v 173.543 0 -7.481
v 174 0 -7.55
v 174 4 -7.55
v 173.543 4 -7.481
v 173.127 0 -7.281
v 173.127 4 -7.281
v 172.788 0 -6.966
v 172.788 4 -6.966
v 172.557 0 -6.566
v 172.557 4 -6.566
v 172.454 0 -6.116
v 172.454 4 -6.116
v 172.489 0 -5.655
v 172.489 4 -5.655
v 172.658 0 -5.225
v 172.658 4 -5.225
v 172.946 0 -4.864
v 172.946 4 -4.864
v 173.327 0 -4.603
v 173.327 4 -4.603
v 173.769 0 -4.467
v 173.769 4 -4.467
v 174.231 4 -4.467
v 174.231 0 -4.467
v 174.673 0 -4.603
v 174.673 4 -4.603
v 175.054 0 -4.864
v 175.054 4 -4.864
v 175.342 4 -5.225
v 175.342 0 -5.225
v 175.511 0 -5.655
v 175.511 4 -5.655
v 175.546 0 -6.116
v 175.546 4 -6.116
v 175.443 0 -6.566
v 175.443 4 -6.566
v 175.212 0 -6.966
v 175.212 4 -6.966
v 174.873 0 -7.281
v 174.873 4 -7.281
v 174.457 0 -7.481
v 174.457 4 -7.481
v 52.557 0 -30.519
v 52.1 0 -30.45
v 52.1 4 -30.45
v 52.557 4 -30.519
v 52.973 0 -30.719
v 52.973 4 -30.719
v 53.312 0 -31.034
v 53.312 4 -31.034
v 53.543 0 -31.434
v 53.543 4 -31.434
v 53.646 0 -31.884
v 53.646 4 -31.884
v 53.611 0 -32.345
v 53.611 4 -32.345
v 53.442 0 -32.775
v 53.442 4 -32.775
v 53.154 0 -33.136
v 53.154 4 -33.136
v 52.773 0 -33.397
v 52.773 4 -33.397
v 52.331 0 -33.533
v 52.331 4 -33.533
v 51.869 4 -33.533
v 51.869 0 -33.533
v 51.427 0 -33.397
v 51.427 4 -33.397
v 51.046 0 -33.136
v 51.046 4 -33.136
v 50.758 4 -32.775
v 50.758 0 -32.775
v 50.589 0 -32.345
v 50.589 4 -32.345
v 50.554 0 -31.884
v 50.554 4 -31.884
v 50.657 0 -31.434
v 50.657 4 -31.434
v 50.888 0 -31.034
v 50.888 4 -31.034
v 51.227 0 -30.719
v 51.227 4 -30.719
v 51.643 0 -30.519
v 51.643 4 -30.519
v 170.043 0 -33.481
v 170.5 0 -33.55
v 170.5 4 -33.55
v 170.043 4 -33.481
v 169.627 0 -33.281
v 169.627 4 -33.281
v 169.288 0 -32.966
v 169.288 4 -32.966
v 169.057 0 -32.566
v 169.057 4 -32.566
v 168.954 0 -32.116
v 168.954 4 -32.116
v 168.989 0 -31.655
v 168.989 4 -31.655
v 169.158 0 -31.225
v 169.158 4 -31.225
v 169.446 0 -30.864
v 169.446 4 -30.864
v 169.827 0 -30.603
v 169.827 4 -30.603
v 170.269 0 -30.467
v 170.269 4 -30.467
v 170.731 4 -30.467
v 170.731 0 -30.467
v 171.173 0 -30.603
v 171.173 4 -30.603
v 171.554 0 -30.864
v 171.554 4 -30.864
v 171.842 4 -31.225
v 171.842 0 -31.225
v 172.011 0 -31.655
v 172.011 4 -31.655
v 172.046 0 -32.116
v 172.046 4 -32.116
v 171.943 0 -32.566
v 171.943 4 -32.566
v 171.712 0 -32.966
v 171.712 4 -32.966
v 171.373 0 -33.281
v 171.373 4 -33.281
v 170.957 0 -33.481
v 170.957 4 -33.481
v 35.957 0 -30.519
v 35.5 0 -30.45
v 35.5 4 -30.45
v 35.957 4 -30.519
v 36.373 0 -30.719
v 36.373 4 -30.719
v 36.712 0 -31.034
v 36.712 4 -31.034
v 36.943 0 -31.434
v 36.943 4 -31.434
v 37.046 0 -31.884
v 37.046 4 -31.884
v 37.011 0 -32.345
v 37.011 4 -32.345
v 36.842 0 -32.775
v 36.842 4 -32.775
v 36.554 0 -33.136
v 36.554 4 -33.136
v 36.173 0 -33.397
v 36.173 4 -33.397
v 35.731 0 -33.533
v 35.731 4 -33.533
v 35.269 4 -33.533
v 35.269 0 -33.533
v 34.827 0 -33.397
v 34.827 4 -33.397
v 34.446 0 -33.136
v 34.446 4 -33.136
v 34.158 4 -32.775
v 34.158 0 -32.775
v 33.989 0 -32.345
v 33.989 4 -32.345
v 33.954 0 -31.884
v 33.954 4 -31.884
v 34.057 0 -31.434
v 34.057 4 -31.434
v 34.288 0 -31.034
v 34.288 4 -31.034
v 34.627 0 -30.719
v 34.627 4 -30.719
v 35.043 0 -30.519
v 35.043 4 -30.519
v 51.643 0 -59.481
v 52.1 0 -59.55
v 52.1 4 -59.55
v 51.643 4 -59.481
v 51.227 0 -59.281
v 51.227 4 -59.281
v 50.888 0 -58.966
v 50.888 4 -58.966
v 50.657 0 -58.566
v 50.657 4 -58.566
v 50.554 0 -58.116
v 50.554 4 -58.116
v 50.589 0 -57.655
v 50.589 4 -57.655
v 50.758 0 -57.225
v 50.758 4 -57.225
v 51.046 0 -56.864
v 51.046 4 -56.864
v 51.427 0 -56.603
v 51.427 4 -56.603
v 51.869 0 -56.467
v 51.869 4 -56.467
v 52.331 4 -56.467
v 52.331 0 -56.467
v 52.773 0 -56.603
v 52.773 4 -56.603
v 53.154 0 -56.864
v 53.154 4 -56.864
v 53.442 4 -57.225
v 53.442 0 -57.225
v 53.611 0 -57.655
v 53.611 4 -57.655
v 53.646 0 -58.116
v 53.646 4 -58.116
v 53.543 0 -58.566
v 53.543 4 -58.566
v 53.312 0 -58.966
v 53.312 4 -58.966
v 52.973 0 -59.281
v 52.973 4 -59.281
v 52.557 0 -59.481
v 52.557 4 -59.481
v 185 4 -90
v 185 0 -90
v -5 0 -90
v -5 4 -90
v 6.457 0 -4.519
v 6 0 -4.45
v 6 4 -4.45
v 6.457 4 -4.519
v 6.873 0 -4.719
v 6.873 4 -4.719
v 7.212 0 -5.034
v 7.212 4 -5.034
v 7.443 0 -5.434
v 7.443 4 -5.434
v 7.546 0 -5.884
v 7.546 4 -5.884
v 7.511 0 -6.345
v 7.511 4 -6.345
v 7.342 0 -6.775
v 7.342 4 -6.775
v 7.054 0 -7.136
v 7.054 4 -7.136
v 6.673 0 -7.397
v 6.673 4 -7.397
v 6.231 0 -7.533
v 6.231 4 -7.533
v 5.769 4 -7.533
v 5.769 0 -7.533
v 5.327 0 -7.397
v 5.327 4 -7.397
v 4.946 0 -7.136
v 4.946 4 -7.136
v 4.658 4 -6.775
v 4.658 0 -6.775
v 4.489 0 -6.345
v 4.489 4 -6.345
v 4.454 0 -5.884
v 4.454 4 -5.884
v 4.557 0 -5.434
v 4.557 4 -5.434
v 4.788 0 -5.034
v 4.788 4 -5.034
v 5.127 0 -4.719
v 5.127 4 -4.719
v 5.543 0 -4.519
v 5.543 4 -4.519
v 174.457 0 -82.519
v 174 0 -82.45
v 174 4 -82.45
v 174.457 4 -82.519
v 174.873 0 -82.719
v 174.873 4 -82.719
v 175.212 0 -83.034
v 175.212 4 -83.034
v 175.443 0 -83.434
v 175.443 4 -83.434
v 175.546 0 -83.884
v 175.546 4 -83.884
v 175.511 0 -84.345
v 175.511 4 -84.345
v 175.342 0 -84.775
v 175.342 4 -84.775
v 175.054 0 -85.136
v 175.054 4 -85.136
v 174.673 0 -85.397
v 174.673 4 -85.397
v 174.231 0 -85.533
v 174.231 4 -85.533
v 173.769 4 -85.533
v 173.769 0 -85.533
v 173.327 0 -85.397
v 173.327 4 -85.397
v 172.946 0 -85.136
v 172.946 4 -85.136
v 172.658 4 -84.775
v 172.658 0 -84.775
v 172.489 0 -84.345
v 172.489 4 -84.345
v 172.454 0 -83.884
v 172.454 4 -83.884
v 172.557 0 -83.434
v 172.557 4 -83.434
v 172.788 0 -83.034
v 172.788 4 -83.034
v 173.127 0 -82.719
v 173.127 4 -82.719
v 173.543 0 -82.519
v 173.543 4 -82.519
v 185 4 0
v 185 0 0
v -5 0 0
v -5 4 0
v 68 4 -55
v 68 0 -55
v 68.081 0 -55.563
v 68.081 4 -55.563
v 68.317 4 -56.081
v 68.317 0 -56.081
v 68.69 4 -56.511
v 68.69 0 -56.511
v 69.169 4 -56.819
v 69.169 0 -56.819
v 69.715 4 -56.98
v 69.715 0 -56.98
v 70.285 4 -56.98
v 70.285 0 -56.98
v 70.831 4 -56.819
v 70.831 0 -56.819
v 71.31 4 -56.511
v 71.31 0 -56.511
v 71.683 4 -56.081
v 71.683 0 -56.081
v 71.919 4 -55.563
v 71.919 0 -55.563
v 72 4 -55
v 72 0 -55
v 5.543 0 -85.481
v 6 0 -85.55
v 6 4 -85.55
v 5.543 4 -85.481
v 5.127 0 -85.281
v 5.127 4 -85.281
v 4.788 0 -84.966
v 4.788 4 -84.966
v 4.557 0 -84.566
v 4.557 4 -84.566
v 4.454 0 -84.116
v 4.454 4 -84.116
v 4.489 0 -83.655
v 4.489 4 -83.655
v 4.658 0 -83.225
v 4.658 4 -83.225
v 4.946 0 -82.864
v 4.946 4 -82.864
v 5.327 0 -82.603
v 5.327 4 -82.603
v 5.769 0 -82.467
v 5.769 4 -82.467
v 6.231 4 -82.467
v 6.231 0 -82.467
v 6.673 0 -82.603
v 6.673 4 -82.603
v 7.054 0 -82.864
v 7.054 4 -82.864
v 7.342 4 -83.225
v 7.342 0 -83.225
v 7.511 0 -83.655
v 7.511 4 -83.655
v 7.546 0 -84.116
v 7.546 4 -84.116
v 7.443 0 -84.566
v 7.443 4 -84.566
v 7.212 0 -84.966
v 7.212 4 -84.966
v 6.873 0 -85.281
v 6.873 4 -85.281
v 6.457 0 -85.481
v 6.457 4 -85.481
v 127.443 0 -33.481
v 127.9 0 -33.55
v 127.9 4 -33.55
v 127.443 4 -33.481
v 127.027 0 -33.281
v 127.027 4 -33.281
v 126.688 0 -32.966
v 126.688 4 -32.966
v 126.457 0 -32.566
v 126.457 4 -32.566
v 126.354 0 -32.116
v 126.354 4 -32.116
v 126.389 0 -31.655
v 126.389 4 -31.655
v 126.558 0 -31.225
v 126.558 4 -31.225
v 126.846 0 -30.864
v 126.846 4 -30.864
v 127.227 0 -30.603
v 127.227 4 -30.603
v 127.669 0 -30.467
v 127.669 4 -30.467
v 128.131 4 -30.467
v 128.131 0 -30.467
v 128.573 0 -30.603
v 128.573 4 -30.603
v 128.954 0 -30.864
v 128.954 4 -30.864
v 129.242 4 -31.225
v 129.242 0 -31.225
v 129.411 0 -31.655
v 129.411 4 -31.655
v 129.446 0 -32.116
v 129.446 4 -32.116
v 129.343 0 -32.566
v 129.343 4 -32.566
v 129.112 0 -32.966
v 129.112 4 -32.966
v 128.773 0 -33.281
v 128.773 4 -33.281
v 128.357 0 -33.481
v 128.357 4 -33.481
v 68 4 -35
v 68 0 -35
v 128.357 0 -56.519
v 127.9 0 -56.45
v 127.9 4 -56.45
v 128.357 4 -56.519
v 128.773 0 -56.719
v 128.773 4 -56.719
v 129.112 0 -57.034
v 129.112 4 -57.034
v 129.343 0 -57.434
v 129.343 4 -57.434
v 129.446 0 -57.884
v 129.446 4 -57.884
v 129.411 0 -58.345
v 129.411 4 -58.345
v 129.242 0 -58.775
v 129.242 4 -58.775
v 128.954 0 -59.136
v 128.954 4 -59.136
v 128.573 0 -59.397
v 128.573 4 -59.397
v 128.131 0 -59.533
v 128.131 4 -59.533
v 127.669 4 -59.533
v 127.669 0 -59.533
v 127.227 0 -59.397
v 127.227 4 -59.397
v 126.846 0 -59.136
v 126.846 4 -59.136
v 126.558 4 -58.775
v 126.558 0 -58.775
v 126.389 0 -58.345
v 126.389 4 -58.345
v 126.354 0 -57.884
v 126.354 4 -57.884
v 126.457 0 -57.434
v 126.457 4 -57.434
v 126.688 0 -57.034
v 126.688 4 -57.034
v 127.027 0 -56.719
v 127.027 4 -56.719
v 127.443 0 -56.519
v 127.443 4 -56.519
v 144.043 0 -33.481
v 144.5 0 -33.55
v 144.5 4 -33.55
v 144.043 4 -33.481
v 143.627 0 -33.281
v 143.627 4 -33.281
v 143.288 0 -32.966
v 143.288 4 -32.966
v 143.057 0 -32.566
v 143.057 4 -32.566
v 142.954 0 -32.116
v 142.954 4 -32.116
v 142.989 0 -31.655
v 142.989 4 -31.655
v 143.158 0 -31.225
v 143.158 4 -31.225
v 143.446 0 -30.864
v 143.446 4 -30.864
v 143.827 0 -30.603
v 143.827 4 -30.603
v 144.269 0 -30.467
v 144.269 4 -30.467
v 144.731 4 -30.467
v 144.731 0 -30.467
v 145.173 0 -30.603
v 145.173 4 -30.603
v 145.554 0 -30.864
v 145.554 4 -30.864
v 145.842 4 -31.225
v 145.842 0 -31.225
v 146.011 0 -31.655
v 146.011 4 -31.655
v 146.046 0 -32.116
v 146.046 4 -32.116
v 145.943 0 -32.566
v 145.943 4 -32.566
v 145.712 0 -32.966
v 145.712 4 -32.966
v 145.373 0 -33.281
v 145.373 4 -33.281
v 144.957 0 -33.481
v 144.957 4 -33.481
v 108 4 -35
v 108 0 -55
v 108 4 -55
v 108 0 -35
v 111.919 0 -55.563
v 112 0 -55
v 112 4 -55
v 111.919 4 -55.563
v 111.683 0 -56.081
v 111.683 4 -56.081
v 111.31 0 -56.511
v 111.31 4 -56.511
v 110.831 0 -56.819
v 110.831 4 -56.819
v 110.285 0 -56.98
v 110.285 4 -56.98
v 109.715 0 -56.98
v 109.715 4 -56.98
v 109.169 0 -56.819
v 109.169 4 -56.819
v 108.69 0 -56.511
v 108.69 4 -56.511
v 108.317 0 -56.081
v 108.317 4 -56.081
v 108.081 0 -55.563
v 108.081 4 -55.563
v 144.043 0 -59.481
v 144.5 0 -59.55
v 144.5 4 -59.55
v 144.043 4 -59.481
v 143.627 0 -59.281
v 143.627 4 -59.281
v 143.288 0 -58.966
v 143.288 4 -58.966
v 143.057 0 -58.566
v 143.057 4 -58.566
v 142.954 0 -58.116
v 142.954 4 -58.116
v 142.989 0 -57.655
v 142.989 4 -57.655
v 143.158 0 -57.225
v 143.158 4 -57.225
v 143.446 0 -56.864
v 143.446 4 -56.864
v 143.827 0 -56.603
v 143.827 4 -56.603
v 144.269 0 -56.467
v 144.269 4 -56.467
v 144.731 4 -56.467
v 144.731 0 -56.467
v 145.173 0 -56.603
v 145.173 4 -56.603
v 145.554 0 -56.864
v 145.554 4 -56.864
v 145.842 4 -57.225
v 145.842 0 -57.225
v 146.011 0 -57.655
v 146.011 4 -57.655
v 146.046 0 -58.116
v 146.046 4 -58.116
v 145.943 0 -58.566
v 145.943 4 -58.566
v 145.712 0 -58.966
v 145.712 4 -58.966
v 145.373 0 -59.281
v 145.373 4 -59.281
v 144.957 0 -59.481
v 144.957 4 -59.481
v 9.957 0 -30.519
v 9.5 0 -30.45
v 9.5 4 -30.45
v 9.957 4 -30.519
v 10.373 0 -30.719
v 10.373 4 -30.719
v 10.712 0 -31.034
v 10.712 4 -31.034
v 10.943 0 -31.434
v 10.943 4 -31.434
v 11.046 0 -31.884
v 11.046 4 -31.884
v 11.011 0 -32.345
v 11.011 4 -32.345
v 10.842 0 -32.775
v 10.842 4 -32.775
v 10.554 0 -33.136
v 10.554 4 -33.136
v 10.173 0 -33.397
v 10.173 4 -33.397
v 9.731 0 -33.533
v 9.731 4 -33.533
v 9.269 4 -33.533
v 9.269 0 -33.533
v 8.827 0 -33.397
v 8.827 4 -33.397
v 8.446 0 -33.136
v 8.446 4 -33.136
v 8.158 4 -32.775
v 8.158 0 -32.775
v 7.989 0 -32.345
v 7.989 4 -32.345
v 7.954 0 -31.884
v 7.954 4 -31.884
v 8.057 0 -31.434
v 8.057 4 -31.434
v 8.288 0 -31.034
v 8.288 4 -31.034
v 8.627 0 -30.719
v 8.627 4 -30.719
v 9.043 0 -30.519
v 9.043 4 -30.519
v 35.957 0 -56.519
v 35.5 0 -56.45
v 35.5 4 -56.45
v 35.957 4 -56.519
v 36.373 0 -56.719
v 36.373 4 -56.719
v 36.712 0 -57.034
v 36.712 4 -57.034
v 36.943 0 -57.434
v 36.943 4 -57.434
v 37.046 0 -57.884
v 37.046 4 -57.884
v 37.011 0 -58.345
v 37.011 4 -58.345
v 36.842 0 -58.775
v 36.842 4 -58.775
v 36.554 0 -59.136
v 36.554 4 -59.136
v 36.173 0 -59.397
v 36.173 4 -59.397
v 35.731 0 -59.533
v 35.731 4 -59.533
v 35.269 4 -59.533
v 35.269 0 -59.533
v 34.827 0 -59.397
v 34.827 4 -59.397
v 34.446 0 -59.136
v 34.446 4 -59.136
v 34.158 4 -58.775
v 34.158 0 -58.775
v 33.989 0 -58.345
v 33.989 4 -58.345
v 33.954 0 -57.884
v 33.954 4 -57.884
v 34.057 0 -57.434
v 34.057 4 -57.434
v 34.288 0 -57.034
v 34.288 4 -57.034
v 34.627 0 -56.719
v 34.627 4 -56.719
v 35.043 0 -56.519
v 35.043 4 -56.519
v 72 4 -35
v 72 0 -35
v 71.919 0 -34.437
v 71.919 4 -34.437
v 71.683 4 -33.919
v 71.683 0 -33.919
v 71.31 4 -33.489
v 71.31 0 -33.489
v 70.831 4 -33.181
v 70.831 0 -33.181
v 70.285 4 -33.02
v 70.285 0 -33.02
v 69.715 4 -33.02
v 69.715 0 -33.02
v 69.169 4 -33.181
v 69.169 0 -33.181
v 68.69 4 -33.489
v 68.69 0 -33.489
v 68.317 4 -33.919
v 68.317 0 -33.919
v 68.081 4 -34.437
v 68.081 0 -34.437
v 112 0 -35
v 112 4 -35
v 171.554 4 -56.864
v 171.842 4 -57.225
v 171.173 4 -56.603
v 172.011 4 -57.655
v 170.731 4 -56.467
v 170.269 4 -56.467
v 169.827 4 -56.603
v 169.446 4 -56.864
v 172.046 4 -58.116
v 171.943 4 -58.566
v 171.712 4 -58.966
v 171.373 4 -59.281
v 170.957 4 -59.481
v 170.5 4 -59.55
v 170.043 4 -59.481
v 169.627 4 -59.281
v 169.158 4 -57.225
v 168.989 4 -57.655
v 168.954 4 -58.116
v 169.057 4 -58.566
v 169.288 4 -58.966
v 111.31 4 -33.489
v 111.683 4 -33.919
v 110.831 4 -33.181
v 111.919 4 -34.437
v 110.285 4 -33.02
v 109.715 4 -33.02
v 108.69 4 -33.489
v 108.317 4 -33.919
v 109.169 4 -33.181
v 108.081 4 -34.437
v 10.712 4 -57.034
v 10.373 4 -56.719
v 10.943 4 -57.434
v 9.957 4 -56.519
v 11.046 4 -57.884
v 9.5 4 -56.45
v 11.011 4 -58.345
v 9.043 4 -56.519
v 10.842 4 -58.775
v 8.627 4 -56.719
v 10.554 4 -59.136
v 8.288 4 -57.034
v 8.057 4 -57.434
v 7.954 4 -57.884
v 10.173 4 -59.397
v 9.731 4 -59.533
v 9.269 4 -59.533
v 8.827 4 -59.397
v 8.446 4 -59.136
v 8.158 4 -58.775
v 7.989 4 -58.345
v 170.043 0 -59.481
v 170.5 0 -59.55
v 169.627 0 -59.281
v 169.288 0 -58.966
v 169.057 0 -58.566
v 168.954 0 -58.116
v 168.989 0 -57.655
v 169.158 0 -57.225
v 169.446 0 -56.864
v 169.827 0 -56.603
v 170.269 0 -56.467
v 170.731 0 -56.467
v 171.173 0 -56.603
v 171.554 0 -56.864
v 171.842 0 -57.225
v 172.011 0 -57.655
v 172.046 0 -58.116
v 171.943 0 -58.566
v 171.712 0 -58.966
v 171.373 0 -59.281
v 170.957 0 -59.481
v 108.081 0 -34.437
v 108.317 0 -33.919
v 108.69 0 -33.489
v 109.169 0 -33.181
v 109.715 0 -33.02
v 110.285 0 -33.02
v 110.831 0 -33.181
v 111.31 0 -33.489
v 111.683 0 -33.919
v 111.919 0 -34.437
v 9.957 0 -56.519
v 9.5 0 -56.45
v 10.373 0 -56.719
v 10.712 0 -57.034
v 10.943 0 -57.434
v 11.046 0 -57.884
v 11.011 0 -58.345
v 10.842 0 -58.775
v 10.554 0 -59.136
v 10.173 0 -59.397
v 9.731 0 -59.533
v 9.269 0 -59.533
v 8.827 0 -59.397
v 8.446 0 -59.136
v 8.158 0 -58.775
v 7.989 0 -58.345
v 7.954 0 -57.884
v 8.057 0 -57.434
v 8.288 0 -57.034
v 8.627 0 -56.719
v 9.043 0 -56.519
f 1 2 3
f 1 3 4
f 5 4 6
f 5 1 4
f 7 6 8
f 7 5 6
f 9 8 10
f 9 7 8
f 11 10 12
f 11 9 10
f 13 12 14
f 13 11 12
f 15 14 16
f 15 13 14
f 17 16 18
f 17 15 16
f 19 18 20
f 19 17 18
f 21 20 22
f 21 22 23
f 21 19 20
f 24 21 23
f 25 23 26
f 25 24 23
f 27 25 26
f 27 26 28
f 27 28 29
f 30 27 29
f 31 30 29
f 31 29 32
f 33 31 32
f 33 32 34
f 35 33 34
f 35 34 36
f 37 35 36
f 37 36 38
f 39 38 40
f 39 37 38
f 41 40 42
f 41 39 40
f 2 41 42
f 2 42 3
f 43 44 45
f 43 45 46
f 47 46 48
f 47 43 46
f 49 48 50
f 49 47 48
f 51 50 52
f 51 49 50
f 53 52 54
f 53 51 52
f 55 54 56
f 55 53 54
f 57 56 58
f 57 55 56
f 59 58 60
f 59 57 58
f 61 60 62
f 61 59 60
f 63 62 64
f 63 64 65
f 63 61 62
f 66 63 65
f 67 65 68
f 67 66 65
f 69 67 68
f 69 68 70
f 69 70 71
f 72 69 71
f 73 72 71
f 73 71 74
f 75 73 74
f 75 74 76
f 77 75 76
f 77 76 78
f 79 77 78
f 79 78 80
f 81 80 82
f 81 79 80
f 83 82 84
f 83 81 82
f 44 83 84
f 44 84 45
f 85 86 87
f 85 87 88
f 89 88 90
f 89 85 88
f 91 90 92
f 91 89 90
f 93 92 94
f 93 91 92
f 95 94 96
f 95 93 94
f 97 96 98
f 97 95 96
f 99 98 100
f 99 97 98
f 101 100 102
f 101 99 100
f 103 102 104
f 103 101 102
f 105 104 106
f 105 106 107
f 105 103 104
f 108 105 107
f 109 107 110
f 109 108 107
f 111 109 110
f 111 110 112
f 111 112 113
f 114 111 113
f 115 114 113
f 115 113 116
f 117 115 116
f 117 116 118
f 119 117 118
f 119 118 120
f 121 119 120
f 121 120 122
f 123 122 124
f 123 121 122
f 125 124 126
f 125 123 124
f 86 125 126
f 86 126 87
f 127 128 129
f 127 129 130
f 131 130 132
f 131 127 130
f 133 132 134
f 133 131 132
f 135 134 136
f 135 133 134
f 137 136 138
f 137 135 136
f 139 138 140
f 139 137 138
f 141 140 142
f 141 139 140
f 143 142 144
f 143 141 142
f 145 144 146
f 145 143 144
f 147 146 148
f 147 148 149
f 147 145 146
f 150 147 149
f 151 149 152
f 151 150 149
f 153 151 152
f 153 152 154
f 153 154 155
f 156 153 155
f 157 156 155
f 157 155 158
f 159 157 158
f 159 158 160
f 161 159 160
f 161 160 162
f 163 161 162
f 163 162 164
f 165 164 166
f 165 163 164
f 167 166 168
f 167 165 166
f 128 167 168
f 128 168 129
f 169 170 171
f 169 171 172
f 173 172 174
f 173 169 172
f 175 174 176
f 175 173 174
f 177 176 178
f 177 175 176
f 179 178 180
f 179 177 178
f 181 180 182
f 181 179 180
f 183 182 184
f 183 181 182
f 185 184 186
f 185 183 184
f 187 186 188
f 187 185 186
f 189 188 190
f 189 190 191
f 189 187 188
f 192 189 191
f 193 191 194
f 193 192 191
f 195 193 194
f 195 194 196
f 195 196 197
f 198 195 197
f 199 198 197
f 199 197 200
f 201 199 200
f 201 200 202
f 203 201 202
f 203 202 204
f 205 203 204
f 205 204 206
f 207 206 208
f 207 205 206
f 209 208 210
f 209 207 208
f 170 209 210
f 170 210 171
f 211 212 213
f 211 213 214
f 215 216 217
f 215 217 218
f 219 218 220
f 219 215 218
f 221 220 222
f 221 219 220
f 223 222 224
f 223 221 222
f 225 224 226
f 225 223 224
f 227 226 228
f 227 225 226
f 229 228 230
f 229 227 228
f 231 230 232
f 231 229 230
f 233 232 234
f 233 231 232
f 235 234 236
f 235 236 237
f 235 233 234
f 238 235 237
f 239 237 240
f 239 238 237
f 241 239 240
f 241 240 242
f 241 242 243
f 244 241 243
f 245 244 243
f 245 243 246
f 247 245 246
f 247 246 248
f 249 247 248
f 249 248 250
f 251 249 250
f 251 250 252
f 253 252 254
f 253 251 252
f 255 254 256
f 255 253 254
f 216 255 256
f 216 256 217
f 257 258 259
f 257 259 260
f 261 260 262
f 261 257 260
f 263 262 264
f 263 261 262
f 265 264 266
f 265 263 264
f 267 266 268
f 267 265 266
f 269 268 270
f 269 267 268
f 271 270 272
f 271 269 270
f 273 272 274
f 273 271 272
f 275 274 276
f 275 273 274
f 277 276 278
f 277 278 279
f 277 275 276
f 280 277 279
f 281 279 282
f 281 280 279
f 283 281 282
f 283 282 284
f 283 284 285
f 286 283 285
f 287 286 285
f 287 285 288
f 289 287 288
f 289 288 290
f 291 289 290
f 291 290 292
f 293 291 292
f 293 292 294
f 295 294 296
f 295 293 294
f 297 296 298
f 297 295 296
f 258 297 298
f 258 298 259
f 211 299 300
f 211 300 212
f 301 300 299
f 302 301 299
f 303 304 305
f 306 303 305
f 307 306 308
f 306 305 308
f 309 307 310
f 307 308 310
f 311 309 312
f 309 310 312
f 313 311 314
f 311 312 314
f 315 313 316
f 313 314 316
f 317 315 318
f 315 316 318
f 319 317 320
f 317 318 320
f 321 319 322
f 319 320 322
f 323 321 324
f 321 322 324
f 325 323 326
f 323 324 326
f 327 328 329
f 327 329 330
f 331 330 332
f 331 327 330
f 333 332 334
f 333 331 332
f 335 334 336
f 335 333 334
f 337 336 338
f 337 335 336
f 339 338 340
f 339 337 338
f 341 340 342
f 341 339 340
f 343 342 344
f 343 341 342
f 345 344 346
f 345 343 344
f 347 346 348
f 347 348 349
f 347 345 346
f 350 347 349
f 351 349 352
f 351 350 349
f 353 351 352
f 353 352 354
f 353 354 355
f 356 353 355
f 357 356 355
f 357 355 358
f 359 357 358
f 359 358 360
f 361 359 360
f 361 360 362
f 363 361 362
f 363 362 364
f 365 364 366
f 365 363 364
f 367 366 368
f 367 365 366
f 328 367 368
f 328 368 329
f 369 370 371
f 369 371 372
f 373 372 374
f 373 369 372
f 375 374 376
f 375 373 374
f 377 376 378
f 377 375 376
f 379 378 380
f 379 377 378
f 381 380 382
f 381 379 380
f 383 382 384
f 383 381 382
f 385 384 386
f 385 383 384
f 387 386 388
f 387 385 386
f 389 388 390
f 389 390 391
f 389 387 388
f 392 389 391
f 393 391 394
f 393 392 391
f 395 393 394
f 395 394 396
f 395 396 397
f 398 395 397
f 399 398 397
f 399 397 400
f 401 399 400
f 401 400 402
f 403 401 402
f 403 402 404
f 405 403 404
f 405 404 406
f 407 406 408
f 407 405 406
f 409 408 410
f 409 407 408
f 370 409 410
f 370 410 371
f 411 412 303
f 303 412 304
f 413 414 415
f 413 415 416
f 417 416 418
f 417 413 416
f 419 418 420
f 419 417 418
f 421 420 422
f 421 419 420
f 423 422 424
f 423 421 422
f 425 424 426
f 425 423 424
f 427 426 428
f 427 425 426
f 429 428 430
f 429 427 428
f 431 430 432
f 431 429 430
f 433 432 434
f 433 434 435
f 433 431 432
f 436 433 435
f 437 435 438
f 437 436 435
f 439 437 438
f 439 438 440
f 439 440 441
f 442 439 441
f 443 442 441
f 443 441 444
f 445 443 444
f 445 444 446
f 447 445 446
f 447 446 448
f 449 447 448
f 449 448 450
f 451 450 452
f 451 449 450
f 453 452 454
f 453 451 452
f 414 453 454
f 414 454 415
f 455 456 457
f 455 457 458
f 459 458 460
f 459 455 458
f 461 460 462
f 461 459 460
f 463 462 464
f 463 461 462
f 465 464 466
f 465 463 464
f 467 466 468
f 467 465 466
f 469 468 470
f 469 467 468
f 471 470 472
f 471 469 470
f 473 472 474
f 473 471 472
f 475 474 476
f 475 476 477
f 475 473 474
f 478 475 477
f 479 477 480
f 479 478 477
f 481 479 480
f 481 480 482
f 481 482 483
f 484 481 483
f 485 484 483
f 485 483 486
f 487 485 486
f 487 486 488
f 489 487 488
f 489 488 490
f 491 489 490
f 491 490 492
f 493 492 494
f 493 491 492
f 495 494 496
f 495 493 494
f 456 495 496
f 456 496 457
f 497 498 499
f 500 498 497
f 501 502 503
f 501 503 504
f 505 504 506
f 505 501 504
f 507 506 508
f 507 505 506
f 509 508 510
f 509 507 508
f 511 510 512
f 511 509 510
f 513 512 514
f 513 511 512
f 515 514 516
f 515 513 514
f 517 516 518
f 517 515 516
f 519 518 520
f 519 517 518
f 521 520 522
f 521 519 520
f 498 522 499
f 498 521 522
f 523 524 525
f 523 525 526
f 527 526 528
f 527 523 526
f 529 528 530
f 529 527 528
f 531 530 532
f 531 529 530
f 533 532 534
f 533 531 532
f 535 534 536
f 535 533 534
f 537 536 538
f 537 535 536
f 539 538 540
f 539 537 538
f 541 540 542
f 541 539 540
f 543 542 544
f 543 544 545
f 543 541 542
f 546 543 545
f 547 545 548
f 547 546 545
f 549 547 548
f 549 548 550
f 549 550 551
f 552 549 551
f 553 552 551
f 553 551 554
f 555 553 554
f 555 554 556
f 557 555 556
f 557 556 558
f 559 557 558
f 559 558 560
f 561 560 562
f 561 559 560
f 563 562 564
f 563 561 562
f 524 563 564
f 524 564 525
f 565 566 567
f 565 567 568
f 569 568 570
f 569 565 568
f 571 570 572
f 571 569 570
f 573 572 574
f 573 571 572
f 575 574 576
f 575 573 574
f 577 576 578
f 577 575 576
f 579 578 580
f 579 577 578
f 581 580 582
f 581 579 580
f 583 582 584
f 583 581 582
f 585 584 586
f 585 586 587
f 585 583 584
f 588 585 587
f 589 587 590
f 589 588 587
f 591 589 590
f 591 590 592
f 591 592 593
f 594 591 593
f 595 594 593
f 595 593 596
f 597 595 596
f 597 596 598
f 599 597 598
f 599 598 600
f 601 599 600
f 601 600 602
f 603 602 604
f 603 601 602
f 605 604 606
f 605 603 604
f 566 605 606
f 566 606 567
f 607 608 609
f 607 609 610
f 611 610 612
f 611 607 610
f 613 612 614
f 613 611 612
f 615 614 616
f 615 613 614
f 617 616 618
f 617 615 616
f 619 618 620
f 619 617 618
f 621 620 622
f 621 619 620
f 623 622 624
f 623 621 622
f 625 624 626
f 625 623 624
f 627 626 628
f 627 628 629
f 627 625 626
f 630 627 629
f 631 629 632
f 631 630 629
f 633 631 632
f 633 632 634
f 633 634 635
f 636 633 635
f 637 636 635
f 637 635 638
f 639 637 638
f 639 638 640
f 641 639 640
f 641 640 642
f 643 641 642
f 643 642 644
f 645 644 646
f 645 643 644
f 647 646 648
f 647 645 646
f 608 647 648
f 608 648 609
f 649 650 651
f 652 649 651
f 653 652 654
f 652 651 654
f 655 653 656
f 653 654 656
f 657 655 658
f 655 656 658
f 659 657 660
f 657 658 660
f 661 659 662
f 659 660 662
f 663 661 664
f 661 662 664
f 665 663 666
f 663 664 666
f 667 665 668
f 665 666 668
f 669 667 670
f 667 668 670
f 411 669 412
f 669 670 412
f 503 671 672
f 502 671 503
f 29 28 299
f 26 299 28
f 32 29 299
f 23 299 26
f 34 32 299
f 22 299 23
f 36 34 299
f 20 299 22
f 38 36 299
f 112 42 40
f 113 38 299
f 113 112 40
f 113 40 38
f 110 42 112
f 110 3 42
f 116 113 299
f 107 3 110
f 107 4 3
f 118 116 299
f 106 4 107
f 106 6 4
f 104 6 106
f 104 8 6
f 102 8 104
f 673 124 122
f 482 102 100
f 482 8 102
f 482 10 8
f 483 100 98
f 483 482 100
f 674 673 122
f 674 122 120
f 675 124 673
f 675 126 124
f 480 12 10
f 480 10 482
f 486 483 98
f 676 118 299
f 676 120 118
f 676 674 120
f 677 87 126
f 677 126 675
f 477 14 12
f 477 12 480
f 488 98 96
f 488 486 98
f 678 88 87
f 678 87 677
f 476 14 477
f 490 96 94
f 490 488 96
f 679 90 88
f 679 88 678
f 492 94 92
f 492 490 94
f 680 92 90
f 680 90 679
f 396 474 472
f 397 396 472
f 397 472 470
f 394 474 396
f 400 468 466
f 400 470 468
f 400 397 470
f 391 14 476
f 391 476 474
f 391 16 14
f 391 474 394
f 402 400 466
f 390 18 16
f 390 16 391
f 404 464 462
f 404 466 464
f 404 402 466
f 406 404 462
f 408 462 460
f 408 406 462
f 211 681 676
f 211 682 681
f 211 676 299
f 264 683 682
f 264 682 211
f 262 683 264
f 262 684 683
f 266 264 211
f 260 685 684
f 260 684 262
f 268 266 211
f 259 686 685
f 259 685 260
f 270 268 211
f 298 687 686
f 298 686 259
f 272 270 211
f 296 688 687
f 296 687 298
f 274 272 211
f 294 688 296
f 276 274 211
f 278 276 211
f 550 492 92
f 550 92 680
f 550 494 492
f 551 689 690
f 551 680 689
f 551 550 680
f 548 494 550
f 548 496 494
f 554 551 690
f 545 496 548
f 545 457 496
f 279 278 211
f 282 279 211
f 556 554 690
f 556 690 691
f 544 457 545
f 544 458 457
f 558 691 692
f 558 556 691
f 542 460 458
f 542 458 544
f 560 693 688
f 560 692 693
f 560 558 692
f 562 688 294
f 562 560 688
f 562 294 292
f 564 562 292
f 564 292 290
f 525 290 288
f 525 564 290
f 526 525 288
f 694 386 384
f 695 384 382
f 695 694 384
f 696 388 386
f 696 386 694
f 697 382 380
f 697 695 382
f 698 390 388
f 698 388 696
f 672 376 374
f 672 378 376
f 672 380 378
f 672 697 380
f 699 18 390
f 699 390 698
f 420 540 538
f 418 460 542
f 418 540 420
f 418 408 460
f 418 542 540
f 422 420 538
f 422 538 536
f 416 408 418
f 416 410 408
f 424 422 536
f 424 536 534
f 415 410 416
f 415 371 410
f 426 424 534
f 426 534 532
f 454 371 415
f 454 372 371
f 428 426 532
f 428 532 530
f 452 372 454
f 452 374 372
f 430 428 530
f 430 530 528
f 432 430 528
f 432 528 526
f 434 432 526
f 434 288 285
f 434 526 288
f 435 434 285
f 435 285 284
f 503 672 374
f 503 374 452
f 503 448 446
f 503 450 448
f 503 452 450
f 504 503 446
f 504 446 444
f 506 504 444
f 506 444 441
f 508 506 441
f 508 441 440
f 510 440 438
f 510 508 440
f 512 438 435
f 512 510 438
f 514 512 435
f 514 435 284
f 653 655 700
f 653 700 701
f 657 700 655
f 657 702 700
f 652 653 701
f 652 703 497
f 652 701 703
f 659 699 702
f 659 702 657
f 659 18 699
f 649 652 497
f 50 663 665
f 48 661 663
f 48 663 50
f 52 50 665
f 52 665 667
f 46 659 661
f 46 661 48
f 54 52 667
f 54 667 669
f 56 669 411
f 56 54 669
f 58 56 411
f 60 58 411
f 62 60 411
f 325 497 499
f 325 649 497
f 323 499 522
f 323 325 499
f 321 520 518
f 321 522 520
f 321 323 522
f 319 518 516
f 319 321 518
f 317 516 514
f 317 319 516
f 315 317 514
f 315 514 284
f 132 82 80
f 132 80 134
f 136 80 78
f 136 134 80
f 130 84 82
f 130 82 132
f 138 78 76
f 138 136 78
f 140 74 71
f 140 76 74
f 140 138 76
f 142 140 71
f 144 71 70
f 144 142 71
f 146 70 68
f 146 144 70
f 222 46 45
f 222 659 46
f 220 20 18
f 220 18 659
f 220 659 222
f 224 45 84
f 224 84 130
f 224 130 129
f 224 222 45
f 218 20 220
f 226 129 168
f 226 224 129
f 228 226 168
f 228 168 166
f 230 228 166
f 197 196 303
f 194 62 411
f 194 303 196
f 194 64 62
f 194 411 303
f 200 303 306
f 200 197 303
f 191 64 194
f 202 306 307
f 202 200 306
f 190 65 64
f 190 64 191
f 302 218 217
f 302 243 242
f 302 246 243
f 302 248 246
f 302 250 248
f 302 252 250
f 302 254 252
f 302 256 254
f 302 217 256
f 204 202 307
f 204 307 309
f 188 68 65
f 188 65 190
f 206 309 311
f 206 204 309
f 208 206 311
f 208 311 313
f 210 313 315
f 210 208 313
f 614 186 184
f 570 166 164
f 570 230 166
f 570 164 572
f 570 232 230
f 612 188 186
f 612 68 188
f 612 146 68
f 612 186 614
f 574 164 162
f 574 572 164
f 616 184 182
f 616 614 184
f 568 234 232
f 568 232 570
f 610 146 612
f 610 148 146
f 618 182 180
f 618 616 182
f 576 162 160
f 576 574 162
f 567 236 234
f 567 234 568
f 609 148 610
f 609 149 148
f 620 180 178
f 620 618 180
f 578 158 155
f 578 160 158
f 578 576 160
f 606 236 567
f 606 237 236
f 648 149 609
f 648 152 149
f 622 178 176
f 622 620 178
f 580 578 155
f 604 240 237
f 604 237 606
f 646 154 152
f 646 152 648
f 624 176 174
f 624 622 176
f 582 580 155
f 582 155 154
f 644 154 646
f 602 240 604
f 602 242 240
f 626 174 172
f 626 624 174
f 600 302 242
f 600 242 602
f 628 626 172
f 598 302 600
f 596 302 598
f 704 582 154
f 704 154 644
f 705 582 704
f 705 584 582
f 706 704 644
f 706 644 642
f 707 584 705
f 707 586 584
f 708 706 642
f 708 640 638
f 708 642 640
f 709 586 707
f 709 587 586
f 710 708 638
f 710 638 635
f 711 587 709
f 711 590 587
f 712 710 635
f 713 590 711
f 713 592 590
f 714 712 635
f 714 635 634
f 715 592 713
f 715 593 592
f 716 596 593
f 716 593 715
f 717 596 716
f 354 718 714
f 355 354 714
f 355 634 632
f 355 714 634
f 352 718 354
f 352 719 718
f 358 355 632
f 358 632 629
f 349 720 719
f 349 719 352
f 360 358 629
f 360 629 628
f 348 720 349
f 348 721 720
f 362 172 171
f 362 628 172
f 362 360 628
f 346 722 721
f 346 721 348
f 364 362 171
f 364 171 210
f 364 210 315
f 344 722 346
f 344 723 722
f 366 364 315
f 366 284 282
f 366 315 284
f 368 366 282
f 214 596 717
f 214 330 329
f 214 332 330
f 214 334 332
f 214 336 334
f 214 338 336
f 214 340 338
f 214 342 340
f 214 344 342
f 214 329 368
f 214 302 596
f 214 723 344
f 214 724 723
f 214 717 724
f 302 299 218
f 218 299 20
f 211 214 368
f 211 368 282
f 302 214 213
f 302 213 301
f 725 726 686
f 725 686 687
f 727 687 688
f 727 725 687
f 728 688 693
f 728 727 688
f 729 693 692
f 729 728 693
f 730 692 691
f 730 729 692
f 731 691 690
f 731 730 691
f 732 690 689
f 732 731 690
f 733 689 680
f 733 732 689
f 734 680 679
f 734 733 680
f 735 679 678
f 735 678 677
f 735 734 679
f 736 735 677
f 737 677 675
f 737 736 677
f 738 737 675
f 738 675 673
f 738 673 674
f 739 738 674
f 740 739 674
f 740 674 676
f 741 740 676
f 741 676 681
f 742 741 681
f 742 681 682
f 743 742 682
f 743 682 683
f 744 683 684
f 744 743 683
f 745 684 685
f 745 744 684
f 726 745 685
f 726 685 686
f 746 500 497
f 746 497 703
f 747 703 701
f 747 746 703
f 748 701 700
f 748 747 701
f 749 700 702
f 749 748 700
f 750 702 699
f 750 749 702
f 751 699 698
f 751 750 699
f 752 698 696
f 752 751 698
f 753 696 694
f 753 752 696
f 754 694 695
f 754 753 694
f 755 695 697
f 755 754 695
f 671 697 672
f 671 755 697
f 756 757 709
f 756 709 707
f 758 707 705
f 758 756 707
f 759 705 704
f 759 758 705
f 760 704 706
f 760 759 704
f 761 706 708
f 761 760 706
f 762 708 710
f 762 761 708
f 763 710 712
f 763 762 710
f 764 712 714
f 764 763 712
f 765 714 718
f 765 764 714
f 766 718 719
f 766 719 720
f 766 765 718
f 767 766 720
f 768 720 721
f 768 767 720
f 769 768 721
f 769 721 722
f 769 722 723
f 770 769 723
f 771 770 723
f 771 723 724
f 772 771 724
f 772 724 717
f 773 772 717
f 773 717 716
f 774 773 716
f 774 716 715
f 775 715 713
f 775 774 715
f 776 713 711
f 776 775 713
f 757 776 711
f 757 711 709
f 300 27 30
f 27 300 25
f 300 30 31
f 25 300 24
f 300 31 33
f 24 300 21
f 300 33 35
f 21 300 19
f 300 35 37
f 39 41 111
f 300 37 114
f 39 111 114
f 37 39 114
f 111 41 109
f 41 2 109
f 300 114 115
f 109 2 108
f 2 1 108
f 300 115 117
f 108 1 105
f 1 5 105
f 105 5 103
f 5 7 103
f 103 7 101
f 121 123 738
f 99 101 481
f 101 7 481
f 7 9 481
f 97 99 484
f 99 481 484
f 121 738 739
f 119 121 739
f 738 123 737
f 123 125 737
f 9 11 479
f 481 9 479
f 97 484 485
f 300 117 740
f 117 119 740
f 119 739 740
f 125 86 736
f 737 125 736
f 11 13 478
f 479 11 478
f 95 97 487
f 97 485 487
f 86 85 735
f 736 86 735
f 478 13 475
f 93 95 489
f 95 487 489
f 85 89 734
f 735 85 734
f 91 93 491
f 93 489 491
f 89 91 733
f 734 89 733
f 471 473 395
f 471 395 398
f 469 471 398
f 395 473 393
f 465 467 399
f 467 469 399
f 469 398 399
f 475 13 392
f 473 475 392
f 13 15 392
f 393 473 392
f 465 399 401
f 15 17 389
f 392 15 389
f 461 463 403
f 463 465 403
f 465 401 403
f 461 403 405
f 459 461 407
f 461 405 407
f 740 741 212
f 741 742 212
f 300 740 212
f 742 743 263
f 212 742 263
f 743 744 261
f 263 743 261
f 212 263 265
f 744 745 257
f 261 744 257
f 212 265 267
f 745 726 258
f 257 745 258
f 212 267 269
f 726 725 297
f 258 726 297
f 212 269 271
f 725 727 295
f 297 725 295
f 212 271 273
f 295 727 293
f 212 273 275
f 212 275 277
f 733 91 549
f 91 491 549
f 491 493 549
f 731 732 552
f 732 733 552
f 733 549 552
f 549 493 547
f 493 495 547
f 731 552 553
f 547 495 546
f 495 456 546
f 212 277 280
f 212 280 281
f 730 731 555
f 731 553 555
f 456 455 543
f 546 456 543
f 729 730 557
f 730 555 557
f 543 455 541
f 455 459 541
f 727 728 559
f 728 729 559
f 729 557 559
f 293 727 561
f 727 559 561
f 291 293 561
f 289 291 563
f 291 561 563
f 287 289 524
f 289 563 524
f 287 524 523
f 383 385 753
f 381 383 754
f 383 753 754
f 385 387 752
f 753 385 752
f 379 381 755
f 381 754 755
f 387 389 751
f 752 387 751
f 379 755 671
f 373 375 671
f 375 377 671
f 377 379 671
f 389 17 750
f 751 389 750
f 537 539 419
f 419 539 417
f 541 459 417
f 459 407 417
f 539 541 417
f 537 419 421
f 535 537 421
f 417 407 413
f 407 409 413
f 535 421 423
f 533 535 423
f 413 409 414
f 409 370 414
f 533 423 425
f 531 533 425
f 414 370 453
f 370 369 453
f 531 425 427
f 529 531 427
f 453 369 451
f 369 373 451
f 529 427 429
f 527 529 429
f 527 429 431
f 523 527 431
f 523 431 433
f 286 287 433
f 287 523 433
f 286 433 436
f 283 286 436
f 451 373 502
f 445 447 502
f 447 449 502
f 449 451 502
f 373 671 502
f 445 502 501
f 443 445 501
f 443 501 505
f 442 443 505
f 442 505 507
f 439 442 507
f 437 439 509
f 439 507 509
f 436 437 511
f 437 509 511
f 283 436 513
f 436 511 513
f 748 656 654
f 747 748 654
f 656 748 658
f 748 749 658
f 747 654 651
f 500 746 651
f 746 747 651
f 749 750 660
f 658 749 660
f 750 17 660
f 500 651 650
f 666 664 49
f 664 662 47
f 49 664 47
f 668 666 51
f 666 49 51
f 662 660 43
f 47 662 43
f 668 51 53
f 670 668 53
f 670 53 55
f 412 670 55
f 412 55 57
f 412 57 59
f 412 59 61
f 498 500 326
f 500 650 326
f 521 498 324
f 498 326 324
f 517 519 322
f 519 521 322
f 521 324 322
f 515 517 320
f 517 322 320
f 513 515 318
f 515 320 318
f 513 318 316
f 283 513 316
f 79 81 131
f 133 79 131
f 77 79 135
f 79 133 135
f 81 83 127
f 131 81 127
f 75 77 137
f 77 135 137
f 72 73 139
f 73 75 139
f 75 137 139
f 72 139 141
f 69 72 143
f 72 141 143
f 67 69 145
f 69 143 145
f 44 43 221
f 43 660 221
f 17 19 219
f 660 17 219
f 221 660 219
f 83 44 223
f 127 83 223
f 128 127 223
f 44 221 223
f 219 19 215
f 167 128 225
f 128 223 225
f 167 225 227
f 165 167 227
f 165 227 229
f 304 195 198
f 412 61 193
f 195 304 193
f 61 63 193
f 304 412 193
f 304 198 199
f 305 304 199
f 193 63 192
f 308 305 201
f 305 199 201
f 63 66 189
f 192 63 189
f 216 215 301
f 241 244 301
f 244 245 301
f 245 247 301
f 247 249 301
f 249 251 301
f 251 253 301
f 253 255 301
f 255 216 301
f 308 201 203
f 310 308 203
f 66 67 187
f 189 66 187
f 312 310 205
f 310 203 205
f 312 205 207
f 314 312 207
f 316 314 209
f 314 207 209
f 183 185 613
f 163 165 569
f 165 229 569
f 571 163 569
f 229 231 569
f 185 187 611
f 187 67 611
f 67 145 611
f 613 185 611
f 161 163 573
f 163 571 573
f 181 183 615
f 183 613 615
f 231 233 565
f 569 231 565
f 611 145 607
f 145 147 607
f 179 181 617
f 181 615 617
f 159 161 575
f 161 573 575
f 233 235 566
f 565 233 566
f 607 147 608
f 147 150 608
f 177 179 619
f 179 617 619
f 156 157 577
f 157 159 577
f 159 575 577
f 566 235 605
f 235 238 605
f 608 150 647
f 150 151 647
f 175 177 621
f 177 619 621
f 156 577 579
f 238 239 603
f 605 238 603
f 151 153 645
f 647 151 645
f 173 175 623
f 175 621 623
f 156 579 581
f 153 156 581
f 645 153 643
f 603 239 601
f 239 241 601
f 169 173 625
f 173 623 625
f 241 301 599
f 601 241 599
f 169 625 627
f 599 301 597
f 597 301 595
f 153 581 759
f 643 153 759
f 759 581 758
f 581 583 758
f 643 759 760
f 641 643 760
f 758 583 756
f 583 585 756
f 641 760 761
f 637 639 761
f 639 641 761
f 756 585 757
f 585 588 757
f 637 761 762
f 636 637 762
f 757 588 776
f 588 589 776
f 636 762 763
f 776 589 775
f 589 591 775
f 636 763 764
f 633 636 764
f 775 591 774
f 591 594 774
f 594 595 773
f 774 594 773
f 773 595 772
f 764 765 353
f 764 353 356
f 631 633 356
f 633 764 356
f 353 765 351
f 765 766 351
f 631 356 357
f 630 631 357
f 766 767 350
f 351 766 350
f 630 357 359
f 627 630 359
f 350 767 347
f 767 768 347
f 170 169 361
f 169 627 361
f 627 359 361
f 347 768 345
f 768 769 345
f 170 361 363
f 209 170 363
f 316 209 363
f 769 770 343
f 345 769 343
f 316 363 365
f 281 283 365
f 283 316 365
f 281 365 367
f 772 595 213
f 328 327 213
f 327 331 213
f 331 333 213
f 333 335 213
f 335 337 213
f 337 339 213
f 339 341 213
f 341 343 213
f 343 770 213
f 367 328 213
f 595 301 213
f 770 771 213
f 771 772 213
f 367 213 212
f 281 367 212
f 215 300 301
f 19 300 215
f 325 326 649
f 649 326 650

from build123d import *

# Parameters (mm, degrees)
SKETCH_1_W      = 180
SKETCH_1_H      = 90
SKETCH_1_R      = 1.55
EXTRUDE_1_DEPTH = 4
SKETCH_3_W      = 90
SKETCH_3_H      = 4
EXTRUDE_2_DEPTH = 5
SKETCH_4_W      = 90
SKETCH_4_H      = 4
EXTRUDE_3_DEPTH = 5


with BuildPart() as part:
    # 草图1 → 凸台-拉伸1 (new body)
    with BuildSketch(Plane(origin=(0, 0, 0), x_dir=(1, 0, 0), z_dir=(0, 1, 0))):
        with Locations((90, 45)):
            Rectangle(SKETCH_1_W, SKETCH_1_H)
        with Locations(Location((9.5, 58, 0), (0, 0, 270))):
            Circle(SKETCH_1_R, mode=Mode.SUBTRACT)
        with Locations(Location((35.5, 58, 0), (0, 0, 270))):
            Circle(SKETCH_1_R, mode=Mode.SUBTRACT)
        with Locations(Location((35.5, 32, 0), (0, 0, 270))):
            Circle(SKETCH_1_R, mode=Mode.SUBTRACT)
        with Locations(Location((9.5, 32, 0), (0, 0, 270))):
            Circle(SKETCH_1_R, mode=Mode.SUBTRACT)
        with Locations(Location((144.5, 58, 0), (0, 0, 90))):
            Circle(SKETCH_1_R, mode=Mode.SUBTRACT)
        with Locations(Location((170.5, 58, 0), (0, 0, 90))):
            Circle(SKETCH_1_R, mode=Mode.SUBTRACT)
        with Locations(Location((170.5, 32, 0), (0, 0, 90))):
            Circle(SKETCH_1_R, mode=Mode.SUBTRACT)
        with Locations(Location((144.5, 32, 0), (0, 0, 90))):
            Circle(SKETCH_1_R, mode=Mode.SUBTRACT)
        with Locations(Location((127.9, 58, 0), (0, 0, 270))):
            Circle(SKETCH_1_R, mode=Mode.SUBTRACT)
        with Locations(Location((174, 84, 0), (0, 0, 270))):
            Circle(SKETCH_1_R, mode=Mode.SUBTRACT)
        with Locations(Location((174, 6, 0), (0, 0, 90))):
            Circle(SKETCH_1_R, mode=Mode.SUBTRACT)
        with Locations(Location((6, 6, 0), (0, 0, 270))):
            Circle(SKETCH_1_R, mode=Mode.SUBTRACT)
        with Locations(Location((6, 84, 0), (0, 0, 90))):
            Circle(SKETCH_1_R, mode=Mode.SUBTRACT)
        with Locations(Location((52.1, 58, 0), (0, 0, 90))):
            Circle(SKETCH_1_R, mode=Mode.SUBTRACT)
        with Locations(Location((127.9, 32, 0), (0, 0, 90))):
            Circle(SKETCH_1_R, mode=Mode.SUBTRACT)
        with Locations(Location((52.1, 32, 0), (0, 0, 270))):
            Circle(SKETCH_1_R, mode=Mode.SUBTRACT)
        with BuildLine():
            Line((68, 35), (68, 55))
            ThreePointArc((68, 55), (70, 57), (72, 55))
            Line((72, 55), (72, 35))
            ThreePointArc((72, 35), (70, 33), (68, 35))
        make_face(mode=Mode.SUBTRACT)
        with BuildLine():
            Line((112, 35), (112, 55))
            ThreePointArc((112, 55), (110, 57), (108, 55))
            Line((108, 55), (108, 35))
            ThreePointArc((108, 35), (110, 33), (112, 35))
        make_face(mode=Mode.SUBTRACT)
    extrude(amount=EXTRUDE_1_DEPTH)

    # 草图3 → 凸台-拉伸2 (add)
    with BuildSketch(Plane.ZY):
        with Locations((-45, 2)):
            Rectangle(SKETCH_3_W, SKETCH_3_H)
    extrude(amount=EXTRUDE_2_DEPTH)

    # 草图4 → 凸台-拉伸3 (add)
    with BuildSketch(Plane(origin=(180, 0, 0), x_dir=(0, 0, -1), z_dir=(1, 0, 0))):
        with Locations((45, 2)):
            Rectangle(SKETCH_4_W, SKETCH_4_H)
    extrude(amount=EXTRUDE_3_DEPTH)


solid = part.part
